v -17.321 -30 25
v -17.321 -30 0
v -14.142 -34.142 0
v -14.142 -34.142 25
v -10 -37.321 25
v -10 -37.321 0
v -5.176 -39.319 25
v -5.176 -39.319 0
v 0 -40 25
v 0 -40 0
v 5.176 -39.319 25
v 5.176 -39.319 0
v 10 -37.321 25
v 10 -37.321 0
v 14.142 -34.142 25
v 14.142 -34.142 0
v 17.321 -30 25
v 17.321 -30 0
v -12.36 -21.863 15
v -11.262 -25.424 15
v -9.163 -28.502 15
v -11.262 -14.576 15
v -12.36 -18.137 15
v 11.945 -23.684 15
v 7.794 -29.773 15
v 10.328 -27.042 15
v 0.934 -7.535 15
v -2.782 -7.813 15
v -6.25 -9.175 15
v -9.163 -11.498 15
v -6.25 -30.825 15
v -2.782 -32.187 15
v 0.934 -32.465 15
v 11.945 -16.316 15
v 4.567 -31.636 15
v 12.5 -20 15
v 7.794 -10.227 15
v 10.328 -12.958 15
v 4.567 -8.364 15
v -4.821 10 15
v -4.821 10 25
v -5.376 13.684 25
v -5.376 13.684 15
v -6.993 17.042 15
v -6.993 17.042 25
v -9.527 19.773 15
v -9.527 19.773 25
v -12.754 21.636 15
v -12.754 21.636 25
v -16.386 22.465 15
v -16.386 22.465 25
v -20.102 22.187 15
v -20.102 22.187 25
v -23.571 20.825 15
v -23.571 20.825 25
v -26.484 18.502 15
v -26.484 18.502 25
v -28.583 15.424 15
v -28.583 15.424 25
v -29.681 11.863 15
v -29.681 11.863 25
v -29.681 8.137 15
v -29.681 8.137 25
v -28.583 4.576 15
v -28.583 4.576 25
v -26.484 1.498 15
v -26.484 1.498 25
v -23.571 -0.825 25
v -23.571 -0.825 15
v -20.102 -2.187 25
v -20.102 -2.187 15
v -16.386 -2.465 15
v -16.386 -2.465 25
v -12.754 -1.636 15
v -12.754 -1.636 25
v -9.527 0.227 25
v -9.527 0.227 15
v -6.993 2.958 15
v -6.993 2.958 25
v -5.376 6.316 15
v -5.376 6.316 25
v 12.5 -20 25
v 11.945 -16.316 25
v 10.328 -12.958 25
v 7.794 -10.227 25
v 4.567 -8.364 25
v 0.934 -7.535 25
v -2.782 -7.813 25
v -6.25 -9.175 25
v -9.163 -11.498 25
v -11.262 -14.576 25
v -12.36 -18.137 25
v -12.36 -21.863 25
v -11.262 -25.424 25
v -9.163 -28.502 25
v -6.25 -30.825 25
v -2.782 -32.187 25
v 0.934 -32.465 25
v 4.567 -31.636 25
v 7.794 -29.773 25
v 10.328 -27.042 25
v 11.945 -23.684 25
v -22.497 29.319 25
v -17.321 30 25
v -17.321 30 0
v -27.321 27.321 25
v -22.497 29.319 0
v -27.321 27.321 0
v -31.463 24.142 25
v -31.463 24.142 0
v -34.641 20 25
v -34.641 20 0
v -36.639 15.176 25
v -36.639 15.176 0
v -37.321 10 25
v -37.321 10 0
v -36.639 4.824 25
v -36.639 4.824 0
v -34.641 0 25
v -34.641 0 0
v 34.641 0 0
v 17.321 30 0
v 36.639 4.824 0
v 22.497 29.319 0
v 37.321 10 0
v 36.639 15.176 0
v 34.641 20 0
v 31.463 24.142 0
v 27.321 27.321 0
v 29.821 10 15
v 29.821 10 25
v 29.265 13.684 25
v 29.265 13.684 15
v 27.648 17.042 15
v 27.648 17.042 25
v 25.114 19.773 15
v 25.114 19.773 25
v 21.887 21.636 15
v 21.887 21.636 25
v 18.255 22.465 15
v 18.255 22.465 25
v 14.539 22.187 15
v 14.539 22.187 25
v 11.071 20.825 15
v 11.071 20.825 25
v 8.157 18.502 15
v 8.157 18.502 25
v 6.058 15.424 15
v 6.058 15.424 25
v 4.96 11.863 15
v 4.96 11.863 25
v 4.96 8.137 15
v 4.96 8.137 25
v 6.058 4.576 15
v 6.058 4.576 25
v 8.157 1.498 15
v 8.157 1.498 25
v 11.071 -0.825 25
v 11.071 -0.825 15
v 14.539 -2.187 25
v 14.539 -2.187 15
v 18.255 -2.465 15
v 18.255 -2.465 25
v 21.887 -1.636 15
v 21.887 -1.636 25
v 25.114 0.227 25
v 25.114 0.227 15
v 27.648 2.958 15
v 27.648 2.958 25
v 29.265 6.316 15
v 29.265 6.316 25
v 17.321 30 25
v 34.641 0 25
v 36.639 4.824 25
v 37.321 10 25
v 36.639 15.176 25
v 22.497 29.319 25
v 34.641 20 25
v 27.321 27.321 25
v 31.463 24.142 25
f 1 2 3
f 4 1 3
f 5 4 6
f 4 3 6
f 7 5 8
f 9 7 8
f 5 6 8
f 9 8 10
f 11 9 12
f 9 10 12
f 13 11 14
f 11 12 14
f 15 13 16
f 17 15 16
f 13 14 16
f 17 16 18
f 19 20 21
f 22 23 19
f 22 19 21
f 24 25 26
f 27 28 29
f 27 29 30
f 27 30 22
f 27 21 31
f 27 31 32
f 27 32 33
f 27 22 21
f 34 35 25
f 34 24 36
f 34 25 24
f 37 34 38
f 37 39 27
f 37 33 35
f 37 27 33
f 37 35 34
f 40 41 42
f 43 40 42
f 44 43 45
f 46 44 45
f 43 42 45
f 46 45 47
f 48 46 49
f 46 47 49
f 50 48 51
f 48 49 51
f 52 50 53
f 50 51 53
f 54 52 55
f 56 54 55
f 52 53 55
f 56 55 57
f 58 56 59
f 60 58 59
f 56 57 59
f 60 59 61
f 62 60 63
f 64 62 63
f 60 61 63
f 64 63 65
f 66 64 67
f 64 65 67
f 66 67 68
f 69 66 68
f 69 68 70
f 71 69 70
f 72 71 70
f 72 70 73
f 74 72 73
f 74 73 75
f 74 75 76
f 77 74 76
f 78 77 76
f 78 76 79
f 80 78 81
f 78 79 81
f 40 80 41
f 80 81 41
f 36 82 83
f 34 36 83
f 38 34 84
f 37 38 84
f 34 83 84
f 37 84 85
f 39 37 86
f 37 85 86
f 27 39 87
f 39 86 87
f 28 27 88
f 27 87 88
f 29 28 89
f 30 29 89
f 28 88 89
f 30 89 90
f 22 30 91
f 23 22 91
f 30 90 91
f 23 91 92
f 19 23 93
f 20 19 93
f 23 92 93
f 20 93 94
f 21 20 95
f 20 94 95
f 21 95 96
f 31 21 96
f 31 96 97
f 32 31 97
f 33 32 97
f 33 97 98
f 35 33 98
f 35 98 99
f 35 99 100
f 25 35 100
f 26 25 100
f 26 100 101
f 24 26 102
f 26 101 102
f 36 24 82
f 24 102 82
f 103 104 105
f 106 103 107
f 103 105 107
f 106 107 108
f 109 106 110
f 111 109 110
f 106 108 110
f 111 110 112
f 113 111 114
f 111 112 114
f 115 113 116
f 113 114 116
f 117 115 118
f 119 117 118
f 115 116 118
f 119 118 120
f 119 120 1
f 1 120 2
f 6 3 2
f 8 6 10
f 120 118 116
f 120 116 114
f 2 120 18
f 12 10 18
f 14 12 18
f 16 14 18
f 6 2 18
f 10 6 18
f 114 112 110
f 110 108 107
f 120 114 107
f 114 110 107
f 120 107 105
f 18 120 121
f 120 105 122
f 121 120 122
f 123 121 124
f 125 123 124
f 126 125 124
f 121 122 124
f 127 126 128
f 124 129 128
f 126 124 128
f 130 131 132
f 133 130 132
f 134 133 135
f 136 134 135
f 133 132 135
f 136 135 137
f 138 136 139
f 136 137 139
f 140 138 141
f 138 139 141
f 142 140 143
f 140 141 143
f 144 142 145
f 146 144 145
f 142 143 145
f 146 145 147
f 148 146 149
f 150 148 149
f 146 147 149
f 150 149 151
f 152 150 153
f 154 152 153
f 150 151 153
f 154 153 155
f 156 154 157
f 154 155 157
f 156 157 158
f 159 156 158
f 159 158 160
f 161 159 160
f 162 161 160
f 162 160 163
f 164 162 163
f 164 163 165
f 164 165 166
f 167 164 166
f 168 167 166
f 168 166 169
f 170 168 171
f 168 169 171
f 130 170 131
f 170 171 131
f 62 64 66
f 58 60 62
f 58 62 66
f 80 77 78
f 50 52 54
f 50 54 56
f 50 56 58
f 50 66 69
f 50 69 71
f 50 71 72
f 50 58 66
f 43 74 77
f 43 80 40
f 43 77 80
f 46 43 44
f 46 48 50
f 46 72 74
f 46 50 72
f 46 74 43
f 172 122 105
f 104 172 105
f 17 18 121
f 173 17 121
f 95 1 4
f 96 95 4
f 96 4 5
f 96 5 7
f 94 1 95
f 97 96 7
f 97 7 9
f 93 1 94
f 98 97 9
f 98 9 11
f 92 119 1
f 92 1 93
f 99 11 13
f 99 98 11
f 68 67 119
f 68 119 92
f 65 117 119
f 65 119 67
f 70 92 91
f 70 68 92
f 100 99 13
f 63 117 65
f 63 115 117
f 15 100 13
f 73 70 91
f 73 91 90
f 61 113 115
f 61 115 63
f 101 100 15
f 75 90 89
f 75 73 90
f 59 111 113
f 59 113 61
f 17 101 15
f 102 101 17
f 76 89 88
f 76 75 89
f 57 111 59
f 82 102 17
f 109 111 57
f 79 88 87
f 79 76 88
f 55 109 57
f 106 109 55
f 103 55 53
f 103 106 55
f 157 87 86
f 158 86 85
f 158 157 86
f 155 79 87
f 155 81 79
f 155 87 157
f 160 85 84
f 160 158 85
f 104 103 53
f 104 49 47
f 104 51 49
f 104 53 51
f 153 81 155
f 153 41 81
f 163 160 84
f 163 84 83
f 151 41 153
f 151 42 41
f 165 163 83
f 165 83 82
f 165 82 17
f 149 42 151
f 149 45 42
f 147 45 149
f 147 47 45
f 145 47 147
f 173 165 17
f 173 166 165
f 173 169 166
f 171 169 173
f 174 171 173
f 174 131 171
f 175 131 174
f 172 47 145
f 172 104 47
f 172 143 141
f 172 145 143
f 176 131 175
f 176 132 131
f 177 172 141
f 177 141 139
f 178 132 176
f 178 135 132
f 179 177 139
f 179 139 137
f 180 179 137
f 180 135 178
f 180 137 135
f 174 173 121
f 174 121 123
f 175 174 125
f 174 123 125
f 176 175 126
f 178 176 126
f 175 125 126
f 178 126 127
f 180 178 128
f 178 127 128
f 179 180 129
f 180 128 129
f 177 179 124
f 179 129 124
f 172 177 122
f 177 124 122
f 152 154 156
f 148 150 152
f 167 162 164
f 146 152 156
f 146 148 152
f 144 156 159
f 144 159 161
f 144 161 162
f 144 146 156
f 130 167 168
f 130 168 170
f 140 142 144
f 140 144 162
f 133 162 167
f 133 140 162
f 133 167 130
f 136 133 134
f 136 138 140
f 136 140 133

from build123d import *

# Parameters (mm, degrees)
F1_DEPTH = 25
F2_R     = 12.5
F3_DEPTH = 10


with BuildPart() as f1:
    # F0 (on Top) → F1 (new body)
    with BuildSketch(Plane.XY):
        with BuildLine():
            Line((17.320508, 30), (-17.320508, 30))
            ThreePointArc((-17.320508, 30), (-34.641016, 20), (-34.641016, 0))
            Line((-34.641016, 0), (-17.320508, -30))
            ThreePointArc((-17.320508, -30), (0, -40), (17.320508, -30))
            Line((17.320508, -30), (34.641016, 0))
            ThreePointArc((34.641016, 0), (34.641016, 20), (17.320508, 30))
        make_face()
    extrude(amount=F1_DEPTH)

    # F2 (on face) → F3 (cut)
    with BuildSketch(Plane.XY.offset(25)):
        with Locations((-17.320508, 10)):
            Circle(F2_R)
        with Locations((0, -20)):
            Circle(F2_R)
        with Locations((17.320508, 10)):
            Circle(F2_R)
    extrude(amount=-F3_DEPTH, mode=Mode.SUBTRACT)


solid = f1.part
